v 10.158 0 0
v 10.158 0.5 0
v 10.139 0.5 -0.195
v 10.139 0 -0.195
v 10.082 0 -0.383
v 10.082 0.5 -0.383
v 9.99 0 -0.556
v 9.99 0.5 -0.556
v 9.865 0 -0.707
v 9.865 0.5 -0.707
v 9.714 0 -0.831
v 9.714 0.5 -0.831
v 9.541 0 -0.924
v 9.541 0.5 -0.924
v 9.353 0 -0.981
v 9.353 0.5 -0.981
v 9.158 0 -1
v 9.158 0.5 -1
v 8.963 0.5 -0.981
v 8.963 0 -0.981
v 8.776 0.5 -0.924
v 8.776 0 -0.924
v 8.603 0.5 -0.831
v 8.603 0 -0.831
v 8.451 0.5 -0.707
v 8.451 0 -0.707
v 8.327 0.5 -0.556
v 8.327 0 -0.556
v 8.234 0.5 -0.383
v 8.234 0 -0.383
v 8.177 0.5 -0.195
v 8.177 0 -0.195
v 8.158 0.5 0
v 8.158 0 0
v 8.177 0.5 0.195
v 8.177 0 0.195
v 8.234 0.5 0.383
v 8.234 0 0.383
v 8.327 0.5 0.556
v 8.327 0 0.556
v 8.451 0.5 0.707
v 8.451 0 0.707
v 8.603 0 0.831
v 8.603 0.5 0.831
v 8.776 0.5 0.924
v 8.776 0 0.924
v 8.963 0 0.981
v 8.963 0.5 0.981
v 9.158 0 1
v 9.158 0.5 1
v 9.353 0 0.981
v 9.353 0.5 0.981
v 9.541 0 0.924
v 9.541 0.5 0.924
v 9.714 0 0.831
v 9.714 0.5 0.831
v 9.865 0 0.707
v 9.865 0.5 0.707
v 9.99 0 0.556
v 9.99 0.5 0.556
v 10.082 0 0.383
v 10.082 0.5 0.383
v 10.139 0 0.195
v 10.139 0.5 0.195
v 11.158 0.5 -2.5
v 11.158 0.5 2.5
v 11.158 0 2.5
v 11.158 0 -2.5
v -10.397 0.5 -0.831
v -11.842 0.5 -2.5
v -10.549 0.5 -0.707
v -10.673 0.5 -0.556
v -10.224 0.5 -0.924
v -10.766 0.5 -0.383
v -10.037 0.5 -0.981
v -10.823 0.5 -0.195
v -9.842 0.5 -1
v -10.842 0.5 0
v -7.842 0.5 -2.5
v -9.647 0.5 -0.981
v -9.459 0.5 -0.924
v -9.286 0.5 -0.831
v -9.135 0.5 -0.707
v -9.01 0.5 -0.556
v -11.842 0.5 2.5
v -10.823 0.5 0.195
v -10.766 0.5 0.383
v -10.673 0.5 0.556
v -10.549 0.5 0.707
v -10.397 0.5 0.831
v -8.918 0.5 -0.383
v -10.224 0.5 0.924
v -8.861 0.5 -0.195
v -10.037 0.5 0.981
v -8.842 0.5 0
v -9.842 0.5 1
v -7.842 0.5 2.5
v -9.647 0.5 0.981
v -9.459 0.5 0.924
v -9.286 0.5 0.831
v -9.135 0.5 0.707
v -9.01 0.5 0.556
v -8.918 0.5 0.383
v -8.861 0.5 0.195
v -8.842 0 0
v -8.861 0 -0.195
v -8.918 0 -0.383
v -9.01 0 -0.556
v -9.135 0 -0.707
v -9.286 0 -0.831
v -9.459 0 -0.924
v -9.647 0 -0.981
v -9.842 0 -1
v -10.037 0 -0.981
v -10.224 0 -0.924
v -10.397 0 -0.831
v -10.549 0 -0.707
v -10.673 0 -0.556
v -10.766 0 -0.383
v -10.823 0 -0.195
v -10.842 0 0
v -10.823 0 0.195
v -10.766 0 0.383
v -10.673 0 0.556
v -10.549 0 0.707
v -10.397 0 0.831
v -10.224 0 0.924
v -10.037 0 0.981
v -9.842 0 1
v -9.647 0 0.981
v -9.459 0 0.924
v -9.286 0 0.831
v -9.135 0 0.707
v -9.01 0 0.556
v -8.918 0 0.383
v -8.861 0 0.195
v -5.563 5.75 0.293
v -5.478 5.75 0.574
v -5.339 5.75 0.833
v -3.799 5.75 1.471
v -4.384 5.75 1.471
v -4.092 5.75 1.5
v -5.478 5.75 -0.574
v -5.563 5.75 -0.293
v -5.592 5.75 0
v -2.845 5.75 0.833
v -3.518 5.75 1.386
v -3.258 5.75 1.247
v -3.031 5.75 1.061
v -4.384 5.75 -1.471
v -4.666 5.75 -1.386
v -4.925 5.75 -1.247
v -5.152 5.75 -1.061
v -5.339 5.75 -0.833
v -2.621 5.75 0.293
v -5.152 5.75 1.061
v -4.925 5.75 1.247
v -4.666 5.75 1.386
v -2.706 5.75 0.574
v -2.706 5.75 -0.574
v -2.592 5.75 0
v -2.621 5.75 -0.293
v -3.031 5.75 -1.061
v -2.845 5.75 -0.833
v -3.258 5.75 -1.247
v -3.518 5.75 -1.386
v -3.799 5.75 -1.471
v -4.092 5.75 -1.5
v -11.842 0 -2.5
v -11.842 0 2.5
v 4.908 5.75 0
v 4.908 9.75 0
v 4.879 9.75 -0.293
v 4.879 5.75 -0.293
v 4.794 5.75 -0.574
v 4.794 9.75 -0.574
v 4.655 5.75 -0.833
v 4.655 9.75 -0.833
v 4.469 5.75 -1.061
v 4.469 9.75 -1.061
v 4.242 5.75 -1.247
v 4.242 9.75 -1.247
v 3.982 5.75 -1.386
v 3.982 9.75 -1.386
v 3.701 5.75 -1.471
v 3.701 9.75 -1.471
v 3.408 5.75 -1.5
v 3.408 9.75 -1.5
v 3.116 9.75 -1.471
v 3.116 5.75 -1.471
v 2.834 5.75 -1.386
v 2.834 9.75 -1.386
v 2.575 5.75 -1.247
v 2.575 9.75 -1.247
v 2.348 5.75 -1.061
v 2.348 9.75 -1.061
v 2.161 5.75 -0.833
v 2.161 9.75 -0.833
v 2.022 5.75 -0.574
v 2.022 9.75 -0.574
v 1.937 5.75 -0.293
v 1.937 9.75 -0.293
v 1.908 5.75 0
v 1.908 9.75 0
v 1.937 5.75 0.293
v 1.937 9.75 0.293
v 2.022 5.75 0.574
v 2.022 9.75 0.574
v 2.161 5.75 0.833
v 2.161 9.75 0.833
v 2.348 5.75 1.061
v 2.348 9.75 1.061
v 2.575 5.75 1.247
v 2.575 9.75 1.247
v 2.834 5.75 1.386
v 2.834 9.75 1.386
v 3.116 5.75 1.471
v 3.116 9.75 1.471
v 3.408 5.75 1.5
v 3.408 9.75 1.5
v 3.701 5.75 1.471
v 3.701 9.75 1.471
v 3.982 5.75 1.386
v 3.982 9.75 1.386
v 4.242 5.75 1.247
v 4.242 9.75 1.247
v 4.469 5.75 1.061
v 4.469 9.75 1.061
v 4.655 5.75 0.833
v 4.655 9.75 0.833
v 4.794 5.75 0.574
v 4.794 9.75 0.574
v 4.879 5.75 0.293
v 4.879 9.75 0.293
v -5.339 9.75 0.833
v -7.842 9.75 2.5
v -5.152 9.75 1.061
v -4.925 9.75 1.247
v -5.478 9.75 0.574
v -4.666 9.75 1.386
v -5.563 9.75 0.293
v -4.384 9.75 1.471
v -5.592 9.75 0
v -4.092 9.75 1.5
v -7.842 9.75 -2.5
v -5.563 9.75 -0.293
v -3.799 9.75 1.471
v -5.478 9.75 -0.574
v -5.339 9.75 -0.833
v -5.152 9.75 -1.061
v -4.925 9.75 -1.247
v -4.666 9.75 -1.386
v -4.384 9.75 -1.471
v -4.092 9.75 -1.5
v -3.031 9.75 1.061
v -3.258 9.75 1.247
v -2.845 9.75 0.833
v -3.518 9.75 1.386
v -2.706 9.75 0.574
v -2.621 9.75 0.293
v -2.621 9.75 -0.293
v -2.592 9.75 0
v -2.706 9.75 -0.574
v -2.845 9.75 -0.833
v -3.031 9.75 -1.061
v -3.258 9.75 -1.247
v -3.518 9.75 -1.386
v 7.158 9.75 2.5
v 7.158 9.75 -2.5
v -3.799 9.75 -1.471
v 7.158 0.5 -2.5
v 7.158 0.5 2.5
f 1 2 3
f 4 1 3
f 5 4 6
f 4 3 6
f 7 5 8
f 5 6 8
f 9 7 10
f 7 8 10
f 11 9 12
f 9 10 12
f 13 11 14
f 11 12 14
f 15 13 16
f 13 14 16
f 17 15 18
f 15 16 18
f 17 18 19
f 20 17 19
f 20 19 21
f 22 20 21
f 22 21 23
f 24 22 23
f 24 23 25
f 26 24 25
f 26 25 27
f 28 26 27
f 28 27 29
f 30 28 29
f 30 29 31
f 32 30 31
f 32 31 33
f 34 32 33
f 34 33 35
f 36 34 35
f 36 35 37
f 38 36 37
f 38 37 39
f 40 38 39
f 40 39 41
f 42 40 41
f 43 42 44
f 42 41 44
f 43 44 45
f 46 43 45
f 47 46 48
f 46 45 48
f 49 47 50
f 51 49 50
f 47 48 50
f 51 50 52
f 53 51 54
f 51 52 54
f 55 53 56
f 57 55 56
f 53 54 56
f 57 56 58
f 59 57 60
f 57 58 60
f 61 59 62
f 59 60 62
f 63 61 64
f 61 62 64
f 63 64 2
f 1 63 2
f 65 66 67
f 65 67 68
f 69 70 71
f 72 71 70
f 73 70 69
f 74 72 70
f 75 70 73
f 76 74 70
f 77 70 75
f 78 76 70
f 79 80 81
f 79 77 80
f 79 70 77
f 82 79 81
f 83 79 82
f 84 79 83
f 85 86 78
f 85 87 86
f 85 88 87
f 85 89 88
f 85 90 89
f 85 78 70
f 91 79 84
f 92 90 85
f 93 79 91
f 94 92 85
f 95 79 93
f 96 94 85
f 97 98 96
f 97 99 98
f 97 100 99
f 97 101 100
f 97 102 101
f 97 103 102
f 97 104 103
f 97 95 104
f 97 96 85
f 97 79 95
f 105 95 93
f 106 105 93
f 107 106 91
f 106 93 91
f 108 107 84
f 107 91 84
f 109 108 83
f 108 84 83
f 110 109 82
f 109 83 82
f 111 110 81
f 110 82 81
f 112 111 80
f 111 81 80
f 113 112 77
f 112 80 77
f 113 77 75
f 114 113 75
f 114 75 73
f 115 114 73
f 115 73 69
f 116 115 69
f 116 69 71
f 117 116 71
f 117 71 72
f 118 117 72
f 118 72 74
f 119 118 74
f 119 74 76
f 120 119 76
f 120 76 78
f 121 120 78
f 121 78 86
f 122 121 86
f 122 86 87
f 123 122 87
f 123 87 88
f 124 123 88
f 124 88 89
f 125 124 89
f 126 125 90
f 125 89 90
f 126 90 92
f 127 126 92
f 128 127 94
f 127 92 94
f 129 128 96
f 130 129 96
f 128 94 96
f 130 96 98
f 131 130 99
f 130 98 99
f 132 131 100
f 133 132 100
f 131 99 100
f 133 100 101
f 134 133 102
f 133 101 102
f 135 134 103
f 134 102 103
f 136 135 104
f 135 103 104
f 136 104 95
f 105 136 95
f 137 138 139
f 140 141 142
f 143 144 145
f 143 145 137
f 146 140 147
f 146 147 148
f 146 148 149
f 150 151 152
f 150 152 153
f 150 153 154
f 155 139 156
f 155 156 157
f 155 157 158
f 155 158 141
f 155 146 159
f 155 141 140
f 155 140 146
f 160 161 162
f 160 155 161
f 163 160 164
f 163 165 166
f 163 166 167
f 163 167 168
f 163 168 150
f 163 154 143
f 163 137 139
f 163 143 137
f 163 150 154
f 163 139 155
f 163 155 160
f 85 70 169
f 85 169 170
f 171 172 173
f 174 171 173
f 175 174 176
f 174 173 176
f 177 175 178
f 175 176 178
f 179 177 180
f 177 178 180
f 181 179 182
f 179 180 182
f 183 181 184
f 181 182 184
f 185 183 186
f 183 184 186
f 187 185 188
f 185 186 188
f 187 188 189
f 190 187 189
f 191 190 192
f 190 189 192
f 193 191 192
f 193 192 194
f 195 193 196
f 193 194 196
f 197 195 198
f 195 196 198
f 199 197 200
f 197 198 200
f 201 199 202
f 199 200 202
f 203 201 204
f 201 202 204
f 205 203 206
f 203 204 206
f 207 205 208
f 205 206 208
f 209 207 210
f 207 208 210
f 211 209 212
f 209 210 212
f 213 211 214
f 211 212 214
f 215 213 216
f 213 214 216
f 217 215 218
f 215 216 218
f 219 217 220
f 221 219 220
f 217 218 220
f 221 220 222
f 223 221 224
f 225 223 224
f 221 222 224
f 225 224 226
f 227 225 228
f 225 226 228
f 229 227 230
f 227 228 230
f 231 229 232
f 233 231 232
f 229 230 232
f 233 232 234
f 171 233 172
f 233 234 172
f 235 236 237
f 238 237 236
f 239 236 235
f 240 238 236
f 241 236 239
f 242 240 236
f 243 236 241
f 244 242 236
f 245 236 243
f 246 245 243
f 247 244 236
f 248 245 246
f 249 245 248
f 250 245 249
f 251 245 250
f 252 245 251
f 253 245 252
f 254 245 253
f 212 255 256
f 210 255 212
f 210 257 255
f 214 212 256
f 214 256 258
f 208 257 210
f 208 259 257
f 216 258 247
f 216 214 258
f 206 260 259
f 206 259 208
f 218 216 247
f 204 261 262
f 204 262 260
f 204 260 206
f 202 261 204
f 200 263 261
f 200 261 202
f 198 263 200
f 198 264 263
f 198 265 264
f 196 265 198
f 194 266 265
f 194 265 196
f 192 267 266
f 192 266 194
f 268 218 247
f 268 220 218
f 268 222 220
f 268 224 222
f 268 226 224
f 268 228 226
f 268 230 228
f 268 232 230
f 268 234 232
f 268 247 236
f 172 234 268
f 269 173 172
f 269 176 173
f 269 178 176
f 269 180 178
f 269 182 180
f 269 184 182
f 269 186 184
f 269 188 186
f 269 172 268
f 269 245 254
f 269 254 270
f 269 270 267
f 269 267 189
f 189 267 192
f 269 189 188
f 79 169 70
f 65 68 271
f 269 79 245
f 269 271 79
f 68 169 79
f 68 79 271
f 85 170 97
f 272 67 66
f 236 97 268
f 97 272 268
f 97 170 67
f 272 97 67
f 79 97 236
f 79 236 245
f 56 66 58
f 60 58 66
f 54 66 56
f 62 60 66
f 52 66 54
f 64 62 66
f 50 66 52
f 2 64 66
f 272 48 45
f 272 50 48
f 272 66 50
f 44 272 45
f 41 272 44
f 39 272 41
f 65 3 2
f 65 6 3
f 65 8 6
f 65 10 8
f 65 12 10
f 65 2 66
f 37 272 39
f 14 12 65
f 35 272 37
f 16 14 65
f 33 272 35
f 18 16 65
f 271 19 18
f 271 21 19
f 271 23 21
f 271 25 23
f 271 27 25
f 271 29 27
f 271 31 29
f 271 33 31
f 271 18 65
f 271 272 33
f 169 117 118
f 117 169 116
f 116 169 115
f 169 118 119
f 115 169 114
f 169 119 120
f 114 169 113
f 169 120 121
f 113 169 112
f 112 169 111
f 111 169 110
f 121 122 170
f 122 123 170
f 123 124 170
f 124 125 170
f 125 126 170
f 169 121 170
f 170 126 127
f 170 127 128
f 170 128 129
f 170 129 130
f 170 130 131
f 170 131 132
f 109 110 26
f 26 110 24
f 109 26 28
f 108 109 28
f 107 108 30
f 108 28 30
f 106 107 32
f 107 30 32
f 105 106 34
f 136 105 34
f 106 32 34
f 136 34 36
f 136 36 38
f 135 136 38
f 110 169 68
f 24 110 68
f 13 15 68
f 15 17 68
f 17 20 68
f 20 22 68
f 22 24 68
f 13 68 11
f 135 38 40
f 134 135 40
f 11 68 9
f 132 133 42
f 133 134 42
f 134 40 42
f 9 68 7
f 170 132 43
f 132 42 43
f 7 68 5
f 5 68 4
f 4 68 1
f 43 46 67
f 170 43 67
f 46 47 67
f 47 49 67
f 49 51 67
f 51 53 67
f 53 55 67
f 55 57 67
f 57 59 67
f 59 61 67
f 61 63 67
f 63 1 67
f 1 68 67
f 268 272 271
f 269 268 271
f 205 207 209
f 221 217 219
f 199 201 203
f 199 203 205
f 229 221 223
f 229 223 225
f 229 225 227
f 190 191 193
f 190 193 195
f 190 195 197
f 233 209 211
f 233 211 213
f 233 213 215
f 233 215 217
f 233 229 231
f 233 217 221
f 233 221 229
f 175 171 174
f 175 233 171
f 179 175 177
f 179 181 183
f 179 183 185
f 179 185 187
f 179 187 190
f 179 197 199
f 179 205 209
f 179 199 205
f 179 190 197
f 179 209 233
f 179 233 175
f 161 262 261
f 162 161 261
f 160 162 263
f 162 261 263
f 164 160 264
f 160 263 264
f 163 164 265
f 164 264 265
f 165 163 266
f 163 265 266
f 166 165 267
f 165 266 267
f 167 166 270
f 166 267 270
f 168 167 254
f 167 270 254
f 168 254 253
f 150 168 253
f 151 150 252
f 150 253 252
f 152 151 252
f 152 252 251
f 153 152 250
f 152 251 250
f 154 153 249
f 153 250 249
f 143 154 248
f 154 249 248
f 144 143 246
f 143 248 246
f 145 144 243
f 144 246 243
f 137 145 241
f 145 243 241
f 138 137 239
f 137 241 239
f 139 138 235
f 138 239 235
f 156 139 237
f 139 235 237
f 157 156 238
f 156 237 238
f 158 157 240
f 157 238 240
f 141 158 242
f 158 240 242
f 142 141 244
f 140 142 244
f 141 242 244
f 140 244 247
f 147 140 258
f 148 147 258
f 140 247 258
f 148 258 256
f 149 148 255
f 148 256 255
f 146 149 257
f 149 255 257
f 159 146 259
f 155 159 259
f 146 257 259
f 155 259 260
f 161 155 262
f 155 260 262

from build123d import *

# Parameters (mm, degrees)
SKETCH1_W           = 15
SKETCH1_H           = 5
BOSS_EXTRUDE1_DEPTH = 9.75
SKETCH2_R           = 1.5
CUT_EXTRUDE1_DEPTH  = 4
SKETCH3_W           = 5
SKETCH3_H           = 0.5
BOSS_EXTRUDE2_DEPTH = 4
SKETCH4_W           = 5
SKETCH4_H           = 0.5
BOSS_EXTRUDE3_DEPTH = 4
SKETCH5_R           = 1
CUT_EXTRUDE2_DEPTH  = 4


with BuildPart() as part:
    # Sketch1 → Boss-Extrude1 (new body)
    with BuildSketch(Plane(origin=(0, 0, 0), x_dir=(1, 0, 0), z_dir=(0, 1, 0))):
        with Locations((-0.341726619, 0)):
            Rectangle(SKETCH1_W, SKETCH1_H)
    extrude(amount=BOSS_EXTRUDE1_DEPTH)

    # Sketch2 → Cut-Extrude1 (cut)
    with BuildSketch(Plane(origin=(0, 9.75, 0), x_dir=(1, 0, 0), z_dir=(0, 1, 0))):
        with Locations((-4.091726619, 0)):
            Circle(SKETCH2_R)
        with Locations((3.408273381, 0)):
            Circle(SKETCH2_R)
    extrude(amount=-CUT_EXTRUDE1_DEPTH, mode=Mode.SUBTRACT)

    # Sketch3 → Boss-Extrude2 (add)
    with BuildSketch(Plane(origin=(7.158273381, 0, 0), x_dir=(0, 0, -1), z_dir=(1, 0, 0))):
        with Locations((0, 0.25)):
            Rectangle(SKETCH3_W, SKETCH3_H)
    extrude(amount=BOSS_EXTRUDE2_DEPTH)

    # Sketch4 → Boss-Extrude3 (add)
    with BuildSketch(Plane.ZY.offset(7.841726619)):
        with Locations((0, 0.25)):
            Rectangle(SKETCH4_W, SKETCH4_H)
    extrude(amount=BOSS_EXTRUDE3_DEPTH)

    # Sketch5 → Cut-Extrude2 (cut)
    with BuildSketch(Plane(origin=(0, 0.5, 0), x_dir=(1, 0, 0), z_dir=(0, 1, 0))):
        with Locations((-9.841726619, 0)):
            Circle(SKETCH5_R)
        with Locations((9.158273381, 0)):
            Circle(SKETCH5_R)
    extrude(amount=-CUT_EXTRUDE2_DEPTH, mode=Mode.SUBTRACT)


solid = part.part
